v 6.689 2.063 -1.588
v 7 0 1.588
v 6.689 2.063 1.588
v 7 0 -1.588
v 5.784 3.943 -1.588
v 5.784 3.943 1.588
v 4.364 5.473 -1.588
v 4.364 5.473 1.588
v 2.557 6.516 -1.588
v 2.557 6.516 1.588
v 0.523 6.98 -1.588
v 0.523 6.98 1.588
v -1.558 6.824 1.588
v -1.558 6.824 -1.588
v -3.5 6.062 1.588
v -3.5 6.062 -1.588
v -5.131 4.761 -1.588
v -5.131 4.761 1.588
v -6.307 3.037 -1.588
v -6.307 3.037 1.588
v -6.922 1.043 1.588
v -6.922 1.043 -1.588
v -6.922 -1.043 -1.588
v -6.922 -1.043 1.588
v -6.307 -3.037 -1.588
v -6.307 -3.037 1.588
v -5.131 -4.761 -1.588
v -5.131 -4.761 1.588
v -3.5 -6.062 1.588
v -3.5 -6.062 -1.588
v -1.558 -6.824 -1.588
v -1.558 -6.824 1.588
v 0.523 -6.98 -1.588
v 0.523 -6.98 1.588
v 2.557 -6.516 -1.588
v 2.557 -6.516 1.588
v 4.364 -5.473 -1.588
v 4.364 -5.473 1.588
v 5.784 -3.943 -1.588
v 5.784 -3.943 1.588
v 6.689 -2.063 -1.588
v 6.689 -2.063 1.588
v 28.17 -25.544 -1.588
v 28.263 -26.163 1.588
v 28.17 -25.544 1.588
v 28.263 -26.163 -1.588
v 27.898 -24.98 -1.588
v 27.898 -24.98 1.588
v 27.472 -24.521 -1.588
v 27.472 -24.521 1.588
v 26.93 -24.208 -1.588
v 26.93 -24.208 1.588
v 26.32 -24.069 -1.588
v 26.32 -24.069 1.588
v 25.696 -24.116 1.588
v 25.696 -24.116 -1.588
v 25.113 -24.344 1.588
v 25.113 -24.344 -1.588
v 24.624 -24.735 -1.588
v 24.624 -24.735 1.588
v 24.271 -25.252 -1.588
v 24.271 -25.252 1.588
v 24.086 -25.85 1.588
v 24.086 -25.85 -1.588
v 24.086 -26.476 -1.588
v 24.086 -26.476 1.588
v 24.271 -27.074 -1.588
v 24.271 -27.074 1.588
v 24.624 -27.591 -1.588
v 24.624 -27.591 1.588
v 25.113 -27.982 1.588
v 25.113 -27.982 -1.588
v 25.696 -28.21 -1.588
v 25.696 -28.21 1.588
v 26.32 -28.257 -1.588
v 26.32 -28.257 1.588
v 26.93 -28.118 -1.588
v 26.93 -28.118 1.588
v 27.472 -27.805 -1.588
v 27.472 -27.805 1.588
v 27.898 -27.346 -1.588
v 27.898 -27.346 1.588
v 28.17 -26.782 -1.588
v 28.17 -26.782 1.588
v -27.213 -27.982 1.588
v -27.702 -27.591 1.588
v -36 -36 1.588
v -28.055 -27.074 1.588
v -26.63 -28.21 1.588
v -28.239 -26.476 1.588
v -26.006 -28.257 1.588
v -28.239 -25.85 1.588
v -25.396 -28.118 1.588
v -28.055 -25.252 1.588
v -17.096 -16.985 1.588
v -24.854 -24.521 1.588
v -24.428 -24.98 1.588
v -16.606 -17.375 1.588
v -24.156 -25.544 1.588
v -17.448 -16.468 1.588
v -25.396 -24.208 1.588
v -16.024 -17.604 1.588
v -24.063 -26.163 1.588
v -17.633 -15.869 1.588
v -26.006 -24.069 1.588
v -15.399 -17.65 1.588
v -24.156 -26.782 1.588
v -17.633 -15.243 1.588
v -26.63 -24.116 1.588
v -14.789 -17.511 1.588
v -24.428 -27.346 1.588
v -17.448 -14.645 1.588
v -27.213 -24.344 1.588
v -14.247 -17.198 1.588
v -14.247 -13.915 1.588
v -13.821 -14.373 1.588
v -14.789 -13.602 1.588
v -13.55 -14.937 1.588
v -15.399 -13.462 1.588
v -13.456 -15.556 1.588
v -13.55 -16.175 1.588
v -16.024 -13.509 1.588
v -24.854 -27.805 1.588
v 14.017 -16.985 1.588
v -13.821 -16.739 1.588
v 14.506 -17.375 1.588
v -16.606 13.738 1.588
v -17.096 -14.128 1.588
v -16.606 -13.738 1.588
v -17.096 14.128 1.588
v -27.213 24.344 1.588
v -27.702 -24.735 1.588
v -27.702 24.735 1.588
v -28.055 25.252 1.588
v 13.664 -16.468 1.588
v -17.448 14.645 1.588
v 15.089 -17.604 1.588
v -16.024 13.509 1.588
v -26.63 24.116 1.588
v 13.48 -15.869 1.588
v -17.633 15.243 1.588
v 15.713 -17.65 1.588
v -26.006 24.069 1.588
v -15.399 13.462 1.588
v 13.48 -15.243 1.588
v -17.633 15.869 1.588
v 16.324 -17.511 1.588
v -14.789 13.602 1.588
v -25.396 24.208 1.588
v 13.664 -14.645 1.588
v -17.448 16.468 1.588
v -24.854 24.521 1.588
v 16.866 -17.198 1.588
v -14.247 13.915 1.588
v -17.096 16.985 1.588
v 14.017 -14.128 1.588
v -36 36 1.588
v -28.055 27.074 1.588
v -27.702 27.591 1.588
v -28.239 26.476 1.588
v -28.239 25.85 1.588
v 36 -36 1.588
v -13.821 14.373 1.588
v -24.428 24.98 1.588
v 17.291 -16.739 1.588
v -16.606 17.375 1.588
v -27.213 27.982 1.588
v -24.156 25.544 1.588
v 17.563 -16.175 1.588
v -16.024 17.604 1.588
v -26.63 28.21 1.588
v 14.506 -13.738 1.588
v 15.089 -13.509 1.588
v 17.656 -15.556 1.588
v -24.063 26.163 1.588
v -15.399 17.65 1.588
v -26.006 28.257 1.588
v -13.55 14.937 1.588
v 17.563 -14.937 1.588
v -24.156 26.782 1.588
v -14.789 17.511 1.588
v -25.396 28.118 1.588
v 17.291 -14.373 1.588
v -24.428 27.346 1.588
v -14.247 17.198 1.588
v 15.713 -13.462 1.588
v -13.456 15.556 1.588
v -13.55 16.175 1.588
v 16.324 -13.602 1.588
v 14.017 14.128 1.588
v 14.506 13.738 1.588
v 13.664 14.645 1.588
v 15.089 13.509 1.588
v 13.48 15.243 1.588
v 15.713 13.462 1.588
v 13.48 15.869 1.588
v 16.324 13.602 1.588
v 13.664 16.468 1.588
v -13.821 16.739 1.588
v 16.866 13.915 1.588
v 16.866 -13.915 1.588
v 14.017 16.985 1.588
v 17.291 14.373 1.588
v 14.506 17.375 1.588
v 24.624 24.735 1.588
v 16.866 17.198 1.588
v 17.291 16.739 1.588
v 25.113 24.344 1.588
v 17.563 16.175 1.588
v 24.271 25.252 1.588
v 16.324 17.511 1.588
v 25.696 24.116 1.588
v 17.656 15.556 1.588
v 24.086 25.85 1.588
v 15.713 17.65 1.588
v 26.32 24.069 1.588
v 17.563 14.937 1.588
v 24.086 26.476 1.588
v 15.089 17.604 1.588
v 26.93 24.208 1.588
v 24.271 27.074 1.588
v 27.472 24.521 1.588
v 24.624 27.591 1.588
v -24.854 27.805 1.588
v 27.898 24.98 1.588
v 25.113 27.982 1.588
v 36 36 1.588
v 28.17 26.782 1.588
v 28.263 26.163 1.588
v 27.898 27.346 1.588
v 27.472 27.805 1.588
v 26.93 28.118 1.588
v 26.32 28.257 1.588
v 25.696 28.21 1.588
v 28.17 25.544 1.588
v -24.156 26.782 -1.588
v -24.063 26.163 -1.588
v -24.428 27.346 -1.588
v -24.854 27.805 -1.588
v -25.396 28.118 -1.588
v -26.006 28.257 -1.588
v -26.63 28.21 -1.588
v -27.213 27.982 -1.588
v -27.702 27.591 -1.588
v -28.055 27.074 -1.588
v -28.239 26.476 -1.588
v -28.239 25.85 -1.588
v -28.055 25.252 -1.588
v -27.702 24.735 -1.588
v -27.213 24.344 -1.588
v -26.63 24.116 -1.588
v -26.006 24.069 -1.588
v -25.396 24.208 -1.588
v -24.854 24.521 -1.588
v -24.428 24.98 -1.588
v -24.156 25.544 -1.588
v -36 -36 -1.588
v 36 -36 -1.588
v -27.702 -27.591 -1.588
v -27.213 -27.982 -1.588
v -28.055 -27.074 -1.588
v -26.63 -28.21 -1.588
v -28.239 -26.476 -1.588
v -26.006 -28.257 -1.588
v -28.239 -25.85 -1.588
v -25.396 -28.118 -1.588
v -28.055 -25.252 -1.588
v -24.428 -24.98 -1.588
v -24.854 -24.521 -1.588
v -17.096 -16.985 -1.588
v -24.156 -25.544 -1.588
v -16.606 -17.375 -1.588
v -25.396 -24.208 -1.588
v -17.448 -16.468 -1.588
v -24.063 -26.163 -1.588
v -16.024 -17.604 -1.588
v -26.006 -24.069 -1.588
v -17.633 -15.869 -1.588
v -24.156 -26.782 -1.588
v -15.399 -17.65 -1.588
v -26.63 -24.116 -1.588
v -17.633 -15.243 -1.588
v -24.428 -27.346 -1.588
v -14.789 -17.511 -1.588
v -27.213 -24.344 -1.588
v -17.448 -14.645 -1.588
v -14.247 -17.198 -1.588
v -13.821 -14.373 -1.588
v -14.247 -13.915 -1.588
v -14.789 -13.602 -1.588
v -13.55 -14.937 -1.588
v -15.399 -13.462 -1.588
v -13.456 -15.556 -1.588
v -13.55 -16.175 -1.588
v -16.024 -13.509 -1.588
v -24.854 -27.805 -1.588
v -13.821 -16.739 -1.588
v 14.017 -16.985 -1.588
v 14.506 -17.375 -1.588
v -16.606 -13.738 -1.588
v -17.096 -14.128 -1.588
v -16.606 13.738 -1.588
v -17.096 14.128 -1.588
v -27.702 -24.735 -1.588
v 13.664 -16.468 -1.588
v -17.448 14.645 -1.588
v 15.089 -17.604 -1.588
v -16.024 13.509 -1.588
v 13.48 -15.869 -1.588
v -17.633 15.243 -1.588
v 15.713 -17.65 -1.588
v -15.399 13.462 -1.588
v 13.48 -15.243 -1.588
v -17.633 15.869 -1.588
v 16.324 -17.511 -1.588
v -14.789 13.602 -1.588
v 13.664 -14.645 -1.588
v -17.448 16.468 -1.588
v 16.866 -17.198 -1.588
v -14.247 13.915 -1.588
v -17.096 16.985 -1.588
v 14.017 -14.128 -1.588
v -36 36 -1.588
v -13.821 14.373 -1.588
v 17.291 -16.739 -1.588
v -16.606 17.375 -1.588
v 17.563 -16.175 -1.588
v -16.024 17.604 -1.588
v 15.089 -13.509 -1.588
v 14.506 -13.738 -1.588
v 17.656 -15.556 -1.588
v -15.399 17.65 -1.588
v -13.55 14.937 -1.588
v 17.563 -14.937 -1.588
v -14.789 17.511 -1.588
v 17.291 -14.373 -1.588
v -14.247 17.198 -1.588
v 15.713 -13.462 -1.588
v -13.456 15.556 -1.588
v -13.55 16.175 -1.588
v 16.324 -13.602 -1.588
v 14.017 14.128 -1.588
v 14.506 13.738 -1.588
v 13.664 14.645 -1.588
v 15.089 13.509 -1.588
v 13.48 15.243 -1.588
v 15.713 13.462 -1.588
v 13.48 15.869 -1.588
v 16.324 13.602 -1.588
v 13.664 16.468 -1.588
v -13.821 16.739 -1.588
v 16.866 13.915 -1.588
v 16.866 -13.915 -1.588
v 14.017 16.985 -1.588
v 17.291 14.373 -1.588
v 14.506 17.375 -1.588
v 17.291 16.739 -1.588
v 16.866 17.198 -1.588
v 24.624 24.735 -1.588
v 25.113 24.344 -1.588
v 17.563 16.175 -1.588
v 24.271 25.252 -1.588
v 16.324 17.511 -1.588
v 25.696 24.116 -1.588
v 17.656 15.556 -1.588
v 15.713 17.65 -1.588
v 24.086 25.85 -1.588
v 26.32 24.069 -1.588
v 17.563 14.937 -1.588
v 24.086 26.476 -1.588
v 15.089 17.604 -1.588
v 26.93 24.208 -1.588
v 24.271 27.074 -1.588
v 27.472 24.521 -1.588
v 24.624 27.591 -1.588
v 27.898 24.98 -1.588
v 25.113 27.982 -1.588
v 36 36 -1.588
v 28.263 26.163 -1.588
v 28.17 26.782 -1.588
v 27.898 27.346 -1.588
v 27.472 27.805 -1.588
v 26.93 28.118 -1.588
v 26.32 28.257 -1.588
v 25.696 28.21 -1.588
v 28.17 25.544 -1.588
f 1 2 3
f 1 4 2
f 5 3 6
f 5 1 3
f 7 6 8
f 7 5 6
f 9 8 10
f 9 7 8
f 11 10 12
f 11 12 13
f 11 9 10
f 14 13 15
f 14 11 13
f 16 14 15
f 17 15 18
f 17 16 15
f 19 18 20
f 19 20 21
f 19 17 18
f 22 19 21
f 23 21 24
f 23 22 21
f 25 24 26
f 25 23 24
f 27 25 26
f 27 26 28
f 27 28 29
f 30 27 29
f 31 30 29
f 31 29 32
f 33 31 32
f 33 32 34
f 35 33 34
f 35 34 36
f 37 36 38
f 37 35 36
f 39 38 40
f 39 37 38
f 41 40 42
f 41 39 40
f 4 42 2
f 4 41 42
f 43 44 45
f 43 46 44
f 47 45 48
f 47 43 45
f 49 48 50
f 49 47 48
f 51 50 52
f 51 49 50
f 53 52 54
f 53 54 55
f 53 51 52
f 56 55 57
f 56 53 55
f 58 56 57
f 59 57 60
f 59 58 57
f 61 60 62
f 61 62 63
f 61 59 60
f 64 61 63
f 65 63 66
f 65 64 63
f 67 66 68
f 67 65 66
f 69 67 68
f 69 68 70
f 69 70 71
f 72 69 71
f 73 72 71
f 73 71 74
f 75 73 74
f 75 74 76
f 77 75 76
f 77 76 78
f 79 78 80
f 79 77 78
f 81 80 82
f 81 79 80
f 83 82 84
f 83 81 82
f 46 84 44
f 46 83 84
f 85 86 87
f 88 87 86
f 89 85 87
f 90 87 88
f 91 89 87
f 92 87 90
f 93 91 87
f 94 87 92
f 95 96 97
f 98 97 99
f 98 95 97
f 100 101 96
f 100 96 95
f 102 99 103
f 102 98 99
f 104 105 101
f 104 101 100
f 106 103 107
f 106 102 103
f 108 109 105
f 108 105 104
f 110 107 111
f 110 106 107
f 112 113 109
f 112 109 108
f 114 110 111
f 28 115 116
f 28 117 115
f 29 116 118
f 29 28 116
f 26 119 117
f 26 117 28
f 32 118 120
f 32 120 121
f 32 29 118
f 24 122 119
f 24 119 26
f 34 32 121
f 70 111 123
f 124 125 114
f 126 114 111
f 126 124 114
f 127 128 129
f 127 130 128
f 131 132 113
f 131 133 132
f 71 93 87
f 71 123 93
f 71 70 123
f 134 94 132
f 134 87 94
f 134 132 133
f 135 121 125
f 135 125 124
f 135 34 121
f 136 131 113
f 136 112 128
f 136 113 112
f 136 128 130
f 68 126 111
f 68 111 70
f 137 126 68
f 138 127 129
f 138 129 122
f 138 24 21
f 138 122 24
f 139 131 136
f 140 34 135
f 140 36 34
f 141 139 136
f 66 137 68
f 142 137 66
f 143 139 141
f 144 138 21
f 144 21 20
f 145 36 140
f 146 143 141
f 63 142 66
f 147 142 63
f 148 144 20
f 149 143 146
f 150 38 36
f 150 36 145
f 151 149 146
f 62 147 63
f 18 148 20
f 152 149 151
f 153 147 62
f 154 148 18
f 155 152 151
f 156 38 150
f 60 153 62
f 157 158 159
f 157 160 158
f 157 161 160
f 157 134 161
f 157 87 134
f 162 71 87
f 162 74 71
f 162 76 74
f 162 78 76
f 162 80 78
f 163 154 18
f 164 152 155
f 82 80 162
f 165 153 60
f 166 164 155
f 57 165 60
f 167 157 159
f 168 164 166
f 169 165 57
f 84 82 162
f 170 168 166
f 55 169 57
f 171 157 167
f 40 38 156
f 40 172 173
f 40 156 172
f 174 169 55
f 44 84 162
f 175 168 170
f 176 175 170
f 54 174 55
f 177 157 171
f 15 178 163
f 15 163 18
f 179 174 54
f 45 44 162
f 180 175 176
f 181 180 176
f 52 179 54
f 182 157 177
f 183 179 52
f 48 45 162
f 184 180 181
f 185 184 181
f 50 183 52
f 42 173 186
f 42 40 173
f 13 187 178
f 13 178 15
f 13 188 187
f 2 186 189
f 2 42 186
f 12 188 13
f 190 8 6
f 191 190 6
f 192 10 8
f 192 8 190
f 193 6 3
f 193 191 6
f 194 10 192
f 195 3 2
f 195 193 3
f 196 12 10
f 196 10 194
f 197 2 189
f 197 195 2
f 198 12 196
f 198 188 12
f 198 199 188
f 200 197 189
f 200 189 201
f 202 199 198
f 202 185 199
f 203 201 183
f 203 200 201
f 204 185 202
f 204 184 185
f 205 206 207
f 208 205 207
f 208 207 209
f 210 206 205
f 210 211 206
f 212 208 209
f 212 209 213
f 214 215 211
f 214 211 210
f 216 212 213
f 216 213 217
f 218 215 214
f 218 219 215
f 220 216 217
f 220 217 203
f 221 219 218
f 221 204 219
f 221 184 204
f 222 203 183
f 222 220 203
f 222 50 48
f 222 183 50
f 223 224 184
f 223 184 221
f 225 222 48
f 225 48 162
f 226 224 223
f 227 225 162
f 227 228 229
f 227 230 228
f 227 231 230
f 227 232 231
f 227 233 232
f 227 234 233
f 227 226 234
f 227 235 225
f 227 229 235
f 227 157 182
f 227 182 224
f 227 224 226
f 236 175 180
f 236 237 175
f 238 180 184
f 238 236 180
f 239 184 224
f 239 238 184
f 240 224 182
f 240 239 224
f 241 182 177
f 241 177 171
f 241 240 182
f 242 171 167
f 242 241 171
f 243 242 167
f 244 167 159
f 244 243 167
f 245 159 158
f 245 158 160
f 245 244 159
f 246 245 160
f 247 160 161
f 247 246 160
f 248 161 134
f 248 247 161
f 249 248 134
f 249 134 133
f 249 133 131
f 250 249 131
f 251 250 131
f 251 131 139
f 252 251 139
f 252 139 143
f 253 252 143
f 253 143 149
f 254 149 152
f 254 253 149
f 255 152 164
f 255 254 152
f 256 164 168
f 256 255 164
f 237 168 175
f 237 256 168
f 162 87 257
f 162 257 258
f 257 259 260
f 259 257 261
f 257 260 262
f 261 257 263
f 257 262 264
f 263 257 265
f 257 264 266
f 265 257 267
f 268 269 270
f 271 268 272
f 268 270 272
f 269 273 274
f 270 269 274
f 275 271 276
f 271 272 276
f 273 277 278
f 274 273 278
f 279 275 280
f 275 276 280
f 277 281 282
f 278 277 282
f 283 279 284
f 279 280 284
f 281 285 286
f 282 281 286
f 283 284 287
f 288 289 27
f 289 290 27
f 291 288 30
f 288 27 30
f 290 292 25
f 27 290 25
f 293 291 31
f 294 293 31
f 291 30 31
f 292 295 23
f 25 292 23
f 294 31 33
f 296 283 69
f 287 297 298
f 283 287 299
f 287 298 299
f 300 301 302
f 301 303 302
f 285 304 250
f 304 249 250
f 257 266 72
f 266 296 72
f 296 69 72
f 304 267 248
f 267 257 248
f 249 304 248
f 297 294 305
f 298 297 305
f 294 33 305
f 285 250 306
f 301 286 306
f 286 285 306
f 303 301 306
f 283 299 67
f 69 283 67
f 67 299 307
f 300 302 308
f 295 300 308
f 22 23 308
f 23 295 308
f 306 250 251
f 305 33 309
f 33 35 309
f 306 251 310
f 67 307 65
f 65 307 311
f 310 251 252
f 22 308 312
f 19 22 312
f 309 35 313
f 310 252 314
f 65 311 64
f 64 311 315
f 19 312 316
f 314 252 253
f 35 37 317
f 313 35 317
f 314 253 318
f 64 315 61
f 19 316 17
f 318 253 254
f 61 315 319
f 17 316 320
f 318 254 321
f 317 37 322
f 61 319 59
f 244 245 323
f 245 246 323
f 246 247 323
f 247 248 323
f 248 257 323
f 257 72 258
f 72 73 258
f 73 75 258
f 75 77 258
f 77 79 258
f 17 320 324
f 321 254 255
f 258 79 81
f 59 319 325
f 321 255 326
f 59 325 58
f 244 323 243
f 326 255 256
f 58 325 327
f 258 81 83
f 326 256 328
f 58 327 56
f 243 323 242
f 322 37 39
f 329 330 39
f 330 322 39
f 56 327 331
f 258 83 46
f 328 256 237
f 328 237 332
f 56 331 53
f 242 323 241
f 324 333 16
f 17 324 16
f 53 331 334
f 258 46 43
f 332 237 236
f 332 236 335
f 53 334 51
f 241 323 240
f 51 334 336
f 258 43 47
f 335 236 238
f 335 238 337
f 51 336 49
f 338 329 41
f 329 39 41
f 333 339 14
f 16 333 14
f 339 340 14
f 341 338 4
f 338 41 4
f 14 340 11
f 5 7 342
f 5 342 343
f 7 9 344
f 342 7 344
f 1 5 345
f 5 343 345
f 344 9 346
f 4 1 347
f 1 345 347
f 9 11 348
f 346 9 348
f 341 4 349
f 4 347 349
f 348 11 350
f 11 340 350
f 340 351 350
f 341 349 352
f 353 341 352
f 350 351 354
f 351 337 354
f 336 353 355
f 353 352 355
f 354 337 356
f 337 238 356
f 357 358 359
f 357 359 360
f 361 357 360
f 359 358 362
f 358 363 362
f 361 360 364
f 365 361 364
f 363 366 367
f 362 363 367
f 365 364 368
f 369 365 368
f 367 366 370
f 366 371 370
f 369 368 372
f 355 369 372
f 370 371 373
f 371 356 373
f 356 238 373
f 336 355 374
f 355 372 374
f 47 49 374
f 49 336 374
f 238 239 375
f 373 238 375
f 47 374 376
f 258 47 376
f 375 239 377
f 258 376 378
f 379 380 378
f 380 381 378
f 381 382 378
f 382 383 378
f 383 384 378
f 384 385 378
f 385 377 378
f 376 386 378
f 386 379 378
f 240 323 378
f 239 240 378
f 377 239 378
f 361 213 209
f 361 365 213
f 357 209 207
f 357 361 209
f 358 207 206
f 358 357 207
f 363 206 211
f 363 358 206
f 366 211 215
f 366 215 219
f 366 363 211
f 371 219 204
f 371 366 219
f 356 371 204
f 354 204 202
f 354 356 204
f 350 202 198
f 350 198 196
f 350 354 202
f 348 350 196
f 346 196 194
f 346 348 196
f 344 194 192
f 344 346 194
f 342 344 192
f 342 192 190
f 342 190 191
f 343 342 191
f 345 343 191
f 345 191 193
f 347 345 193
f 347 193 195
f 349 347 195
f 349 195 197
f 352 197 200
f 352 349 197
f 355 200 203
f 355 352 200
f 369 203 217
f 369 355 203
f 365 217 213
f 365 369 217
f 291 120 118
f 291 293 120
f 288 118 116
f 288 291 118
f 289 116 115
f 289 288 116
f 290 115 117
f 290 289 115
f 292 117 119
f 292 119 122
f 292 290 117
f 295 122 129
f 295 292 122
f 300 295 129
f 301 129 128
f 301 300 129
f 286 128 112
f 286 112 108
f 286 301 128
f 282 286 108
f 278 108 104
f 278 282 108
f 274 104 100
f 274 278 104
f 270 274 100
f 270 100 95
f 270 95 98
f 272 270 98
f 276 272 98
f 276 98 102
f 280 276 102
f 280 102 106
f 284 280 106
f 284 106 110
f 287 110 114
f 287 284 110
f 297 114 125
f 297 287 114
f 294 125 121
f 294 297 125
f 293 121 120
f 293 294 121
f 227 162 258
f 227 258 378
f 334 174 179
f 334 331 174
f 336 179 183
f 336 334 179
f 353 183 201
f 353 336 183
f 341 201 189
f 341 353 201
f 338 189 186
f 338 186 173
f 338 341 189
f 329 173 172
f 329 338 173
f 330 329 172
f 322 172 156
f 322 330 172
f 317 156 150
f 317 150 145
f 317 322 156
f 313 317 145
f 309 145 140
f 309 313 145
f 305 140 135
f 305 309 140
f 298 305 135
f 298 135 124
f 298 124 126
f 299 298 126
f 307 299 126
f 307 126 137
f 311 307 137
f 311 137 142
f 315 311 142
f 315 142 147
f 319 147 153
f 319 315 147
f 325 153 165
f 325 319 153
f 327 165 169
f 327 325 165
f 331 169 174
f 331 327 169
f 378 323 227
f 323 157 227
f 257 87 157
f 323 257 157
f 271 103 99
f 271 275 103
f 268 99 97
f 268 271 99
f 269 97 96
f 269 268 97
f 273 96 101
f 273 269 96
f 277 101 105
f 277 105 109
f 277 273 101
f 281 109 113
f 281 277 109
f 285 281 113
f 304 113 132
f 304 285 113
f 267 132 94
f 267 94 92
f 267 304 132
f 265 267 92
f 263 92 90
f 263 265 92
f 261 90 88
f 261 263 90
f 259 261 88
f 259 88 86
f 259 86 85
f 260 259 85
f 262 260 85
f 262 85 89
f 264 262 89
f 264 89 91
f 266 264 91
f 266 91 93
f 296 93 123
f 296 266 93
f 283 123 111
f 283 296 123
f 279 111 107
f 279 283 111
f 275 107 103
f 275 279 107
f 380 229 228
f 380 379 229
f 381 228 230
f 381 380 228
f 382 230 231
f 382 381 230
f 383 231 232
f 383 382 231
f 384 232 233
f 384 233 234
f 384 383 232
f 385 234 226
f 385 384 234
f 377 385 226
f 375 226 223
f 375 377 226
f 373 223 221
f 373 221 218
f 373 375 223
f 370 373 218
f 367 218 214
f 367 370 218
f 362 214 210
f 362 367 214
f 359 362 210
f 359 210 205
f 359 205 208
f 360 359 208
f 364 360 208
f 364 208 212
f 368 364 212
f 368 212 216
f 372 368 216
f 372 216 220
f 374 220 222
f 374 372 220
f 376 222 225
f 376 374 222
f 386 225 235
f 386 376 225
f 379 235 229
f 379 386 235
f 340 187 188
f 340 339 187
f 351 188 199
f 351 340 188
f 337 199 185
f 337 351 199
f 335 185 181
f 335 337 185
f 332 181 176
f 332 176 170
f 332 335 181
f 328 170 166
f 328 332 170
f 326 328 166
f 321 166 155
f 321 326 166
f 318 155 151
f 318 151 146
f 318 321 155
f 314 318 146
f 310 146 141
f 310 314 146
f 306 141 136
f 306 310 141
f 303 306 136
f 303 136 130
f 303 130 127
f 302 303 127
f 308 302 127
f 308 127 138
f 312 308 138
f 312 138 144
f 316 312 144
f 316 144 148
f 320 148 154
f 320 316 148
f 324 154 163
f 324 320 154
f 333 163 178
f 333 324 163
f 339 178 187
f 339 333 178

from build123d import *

# Parameters (mm, degrees)
SKETCH1_W           = 72
SKETCH1_H           = 72
SKETCH1_R           = 2.1
SKETCH1_R_2         = 7
BOSS_EXTRUDE1_DEPTH = 1.5875


with BuildPart() as part:
    # Sketch1 → Boss-Extrude1 (new, symmetric)
    with BuildSketch(Plane.XY):
        Rectangle(SKETCH1_W, SKETCH1_H)
        with Locations((-15.556349186, 15.556349186)):
            Circle(SKETCH1_R, mode=Mode.SUBTRACT)
        with Locations((15.556349186, 15.556349186)):
            Circle(SKETCH1_R, mode=Mode.SUBTRACT)
        with Locations((15.556349186, -15.556349186)):
            Circle(SKETCH1_R, mode=Mode.SUBTRACT)
        with Locations((-15.556349186, -15.556349186)):
            Circle(SKETCH1_R, mode=Mode.SUBTRACT)
        with Locations((26.162950904, 26.162950904)):
            Circle(SKETCH1_R, mode=Mode.SUBTRACT)
        with Locations((26.162950904, -26.162950904)):
            Circle(SKETCH1_R, mode=Mode.SUBTRACT)
        with Locations((-26.162950904, -26.162950904)):
            Circle(SKETCH1_R, mode=Mode.SUBTRACT)
        with Locations((-26.162950904, 26.162950904)):
            Circle(SKETCH1_R, mode=Mode.SUBTRACT)
        Circle(SKETCH1_R_2, mode=Mode.SUBTRACT)
    extrude(amount=BOSS_EXTRUDE1_DEPTH, both=True)


solid = part.part
